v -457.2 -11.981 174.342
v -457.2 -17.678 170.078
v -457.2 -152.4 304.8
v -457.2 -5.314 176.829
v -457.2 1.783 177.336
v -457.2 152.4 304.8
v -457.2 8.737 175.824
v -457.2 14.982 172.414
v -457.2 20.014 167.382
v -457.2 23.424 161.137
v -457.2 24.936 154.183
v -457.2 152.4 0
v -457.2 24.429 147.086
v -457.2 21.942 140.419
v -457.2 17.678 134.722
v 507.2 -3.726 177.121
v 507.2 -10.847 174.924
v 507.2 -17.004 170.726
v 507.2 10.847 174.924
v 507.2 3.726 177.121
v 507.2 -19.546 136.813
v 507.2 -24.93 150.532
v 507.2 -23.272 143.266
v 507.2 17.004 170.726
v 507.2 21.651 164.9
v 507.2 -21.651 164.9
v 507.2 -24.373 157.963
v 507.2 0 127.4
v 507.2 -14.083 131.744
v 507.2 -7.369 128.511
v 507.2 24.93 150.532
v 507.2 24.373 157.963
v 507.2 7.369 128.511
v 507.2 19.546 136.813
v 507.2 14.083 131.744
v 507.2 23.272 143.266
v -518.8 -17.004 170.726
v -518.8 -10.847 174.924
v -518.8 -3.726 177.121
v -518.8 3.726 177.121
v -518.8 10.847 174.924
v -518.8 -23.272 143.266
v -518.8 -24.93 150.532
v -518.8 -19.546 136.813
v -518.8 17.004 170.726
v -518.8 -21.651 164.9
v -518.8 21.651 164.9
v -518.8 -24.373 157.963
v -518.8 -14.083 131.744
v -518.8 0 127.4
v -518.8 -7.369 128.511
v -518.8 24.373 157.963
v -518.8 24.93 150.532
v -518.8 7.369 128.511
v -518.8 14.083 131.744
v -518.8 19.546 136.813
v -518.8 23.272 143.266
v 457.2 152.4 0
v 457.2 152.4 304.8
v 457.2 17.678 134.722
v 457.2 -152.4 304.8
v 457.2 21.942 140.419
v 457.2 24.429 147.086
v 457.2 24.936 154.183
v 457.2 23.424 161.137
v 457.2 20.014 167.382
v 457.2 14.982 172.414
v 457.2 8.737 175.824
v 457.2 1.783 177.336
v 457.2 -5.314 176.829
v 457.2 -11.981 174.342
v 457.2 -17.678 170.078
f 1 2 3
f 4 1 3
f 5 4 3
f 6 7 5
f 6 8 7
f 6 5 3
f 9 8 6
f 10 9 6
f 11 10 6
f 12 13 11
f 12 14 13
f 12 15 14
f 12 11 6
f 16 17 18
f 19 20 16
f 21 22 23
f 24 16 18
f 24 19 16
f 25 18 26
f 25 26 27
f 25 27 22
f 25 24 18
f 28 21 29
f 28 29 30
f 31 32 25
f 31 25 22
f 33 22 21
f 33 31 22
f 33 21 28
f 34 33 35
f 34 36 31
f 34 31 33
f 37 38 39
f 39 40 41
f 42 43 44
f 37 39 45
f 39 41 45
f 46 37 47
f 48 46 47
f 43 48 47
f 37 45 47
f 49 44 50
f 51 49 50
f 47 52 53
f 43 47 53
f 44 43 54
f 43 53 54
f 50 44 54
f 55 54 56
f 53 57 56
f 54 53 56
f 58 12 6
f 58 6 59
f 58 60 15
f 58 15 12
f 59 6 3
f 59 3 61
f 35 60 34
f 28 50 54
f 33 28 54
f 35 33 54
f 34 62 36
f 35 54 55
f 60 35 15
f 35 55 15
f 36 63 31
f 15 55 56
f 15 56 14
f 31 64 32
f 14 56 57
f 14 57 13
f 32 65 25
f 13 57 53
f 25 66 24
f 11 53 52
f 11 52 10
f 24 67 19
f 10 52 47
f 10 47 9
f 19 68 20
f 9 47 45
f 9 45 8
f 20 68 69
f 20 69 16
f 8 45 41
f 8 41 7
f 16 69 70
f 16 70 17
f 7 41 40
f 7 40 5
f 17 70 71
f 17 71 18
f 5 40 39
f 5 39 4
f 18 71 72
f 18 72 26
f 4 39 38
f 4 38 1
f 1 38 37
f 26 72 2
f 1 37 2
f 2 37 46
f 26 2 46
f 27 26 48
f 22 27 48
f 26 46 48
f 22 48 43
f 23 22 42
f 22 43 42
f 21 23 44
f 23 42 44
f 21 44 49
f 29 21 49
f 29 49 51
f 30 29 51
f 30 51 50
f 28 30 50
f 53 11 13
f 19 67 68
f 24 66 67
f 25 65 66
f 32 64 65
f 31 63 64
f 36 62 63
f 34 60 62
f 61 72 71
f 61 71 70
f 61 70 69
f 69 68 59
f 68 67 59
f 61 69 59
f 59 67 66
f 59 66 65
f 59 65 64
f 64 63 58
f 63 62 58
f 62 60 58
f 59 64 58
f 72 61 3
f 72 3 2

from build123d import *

# Parameters (mm, degrees)
SKETCH1_W                = 914.4
SKETCH1_H                = 304.8
BOSS_EXTRUDE1_DEPTH      = 304.8
CUT_EXTRUDE1_DEPTH       = 914.4
BOSS_EXTRUDE2_DEPTH      = 50
BOSS_EXTRUDE2_DEPTH_BACK = 976
SKETCH3_R                = 25


with BuildPart() as part:
    # Sketch1 → Boss-Extrude1 (new body)
    with BuildSketch(Plane.XY):
        Rectangle(SKETCH1_W, SKETCH1_H)
    extrude(amount=BOSS_EXTRUDE1_DEPTH)

    # Sketch2 → Cut-Extrude1 (cut)
    with BuildSketch(Plane(origin=(457.2, 0, 0), x_dir=(0, 0, -1), z_dir=(1, 0, 0))):
        Polygon((-304.8, -152.4), (0, 152.4), (0, -152.4), align=None)
    extrude(amount=-CUT_EXTRUDE1_DEPTH, mode=Mode.SUBTRACT)

    # Sketch3 → Boss-Extrude2 (add, two sides: drawn at the far end of the back side and taken through both)
    with BuildSketch(Plane(origin=(457.2, 0, 0), x_dir=(0, 0, -1), z_dir=(1, 0, 0)).offset(-BOSS_EXTRUDE2_DEPTH_BACK)):
        with Locations((-152.4, 0)):
            Circle(SKETCH3_R)
    extrude(amount=BOSS_EXTRUDE2_DEPTH + BOSS_EXTRUDE2_DEPTH_BACK)


solid = part.part
